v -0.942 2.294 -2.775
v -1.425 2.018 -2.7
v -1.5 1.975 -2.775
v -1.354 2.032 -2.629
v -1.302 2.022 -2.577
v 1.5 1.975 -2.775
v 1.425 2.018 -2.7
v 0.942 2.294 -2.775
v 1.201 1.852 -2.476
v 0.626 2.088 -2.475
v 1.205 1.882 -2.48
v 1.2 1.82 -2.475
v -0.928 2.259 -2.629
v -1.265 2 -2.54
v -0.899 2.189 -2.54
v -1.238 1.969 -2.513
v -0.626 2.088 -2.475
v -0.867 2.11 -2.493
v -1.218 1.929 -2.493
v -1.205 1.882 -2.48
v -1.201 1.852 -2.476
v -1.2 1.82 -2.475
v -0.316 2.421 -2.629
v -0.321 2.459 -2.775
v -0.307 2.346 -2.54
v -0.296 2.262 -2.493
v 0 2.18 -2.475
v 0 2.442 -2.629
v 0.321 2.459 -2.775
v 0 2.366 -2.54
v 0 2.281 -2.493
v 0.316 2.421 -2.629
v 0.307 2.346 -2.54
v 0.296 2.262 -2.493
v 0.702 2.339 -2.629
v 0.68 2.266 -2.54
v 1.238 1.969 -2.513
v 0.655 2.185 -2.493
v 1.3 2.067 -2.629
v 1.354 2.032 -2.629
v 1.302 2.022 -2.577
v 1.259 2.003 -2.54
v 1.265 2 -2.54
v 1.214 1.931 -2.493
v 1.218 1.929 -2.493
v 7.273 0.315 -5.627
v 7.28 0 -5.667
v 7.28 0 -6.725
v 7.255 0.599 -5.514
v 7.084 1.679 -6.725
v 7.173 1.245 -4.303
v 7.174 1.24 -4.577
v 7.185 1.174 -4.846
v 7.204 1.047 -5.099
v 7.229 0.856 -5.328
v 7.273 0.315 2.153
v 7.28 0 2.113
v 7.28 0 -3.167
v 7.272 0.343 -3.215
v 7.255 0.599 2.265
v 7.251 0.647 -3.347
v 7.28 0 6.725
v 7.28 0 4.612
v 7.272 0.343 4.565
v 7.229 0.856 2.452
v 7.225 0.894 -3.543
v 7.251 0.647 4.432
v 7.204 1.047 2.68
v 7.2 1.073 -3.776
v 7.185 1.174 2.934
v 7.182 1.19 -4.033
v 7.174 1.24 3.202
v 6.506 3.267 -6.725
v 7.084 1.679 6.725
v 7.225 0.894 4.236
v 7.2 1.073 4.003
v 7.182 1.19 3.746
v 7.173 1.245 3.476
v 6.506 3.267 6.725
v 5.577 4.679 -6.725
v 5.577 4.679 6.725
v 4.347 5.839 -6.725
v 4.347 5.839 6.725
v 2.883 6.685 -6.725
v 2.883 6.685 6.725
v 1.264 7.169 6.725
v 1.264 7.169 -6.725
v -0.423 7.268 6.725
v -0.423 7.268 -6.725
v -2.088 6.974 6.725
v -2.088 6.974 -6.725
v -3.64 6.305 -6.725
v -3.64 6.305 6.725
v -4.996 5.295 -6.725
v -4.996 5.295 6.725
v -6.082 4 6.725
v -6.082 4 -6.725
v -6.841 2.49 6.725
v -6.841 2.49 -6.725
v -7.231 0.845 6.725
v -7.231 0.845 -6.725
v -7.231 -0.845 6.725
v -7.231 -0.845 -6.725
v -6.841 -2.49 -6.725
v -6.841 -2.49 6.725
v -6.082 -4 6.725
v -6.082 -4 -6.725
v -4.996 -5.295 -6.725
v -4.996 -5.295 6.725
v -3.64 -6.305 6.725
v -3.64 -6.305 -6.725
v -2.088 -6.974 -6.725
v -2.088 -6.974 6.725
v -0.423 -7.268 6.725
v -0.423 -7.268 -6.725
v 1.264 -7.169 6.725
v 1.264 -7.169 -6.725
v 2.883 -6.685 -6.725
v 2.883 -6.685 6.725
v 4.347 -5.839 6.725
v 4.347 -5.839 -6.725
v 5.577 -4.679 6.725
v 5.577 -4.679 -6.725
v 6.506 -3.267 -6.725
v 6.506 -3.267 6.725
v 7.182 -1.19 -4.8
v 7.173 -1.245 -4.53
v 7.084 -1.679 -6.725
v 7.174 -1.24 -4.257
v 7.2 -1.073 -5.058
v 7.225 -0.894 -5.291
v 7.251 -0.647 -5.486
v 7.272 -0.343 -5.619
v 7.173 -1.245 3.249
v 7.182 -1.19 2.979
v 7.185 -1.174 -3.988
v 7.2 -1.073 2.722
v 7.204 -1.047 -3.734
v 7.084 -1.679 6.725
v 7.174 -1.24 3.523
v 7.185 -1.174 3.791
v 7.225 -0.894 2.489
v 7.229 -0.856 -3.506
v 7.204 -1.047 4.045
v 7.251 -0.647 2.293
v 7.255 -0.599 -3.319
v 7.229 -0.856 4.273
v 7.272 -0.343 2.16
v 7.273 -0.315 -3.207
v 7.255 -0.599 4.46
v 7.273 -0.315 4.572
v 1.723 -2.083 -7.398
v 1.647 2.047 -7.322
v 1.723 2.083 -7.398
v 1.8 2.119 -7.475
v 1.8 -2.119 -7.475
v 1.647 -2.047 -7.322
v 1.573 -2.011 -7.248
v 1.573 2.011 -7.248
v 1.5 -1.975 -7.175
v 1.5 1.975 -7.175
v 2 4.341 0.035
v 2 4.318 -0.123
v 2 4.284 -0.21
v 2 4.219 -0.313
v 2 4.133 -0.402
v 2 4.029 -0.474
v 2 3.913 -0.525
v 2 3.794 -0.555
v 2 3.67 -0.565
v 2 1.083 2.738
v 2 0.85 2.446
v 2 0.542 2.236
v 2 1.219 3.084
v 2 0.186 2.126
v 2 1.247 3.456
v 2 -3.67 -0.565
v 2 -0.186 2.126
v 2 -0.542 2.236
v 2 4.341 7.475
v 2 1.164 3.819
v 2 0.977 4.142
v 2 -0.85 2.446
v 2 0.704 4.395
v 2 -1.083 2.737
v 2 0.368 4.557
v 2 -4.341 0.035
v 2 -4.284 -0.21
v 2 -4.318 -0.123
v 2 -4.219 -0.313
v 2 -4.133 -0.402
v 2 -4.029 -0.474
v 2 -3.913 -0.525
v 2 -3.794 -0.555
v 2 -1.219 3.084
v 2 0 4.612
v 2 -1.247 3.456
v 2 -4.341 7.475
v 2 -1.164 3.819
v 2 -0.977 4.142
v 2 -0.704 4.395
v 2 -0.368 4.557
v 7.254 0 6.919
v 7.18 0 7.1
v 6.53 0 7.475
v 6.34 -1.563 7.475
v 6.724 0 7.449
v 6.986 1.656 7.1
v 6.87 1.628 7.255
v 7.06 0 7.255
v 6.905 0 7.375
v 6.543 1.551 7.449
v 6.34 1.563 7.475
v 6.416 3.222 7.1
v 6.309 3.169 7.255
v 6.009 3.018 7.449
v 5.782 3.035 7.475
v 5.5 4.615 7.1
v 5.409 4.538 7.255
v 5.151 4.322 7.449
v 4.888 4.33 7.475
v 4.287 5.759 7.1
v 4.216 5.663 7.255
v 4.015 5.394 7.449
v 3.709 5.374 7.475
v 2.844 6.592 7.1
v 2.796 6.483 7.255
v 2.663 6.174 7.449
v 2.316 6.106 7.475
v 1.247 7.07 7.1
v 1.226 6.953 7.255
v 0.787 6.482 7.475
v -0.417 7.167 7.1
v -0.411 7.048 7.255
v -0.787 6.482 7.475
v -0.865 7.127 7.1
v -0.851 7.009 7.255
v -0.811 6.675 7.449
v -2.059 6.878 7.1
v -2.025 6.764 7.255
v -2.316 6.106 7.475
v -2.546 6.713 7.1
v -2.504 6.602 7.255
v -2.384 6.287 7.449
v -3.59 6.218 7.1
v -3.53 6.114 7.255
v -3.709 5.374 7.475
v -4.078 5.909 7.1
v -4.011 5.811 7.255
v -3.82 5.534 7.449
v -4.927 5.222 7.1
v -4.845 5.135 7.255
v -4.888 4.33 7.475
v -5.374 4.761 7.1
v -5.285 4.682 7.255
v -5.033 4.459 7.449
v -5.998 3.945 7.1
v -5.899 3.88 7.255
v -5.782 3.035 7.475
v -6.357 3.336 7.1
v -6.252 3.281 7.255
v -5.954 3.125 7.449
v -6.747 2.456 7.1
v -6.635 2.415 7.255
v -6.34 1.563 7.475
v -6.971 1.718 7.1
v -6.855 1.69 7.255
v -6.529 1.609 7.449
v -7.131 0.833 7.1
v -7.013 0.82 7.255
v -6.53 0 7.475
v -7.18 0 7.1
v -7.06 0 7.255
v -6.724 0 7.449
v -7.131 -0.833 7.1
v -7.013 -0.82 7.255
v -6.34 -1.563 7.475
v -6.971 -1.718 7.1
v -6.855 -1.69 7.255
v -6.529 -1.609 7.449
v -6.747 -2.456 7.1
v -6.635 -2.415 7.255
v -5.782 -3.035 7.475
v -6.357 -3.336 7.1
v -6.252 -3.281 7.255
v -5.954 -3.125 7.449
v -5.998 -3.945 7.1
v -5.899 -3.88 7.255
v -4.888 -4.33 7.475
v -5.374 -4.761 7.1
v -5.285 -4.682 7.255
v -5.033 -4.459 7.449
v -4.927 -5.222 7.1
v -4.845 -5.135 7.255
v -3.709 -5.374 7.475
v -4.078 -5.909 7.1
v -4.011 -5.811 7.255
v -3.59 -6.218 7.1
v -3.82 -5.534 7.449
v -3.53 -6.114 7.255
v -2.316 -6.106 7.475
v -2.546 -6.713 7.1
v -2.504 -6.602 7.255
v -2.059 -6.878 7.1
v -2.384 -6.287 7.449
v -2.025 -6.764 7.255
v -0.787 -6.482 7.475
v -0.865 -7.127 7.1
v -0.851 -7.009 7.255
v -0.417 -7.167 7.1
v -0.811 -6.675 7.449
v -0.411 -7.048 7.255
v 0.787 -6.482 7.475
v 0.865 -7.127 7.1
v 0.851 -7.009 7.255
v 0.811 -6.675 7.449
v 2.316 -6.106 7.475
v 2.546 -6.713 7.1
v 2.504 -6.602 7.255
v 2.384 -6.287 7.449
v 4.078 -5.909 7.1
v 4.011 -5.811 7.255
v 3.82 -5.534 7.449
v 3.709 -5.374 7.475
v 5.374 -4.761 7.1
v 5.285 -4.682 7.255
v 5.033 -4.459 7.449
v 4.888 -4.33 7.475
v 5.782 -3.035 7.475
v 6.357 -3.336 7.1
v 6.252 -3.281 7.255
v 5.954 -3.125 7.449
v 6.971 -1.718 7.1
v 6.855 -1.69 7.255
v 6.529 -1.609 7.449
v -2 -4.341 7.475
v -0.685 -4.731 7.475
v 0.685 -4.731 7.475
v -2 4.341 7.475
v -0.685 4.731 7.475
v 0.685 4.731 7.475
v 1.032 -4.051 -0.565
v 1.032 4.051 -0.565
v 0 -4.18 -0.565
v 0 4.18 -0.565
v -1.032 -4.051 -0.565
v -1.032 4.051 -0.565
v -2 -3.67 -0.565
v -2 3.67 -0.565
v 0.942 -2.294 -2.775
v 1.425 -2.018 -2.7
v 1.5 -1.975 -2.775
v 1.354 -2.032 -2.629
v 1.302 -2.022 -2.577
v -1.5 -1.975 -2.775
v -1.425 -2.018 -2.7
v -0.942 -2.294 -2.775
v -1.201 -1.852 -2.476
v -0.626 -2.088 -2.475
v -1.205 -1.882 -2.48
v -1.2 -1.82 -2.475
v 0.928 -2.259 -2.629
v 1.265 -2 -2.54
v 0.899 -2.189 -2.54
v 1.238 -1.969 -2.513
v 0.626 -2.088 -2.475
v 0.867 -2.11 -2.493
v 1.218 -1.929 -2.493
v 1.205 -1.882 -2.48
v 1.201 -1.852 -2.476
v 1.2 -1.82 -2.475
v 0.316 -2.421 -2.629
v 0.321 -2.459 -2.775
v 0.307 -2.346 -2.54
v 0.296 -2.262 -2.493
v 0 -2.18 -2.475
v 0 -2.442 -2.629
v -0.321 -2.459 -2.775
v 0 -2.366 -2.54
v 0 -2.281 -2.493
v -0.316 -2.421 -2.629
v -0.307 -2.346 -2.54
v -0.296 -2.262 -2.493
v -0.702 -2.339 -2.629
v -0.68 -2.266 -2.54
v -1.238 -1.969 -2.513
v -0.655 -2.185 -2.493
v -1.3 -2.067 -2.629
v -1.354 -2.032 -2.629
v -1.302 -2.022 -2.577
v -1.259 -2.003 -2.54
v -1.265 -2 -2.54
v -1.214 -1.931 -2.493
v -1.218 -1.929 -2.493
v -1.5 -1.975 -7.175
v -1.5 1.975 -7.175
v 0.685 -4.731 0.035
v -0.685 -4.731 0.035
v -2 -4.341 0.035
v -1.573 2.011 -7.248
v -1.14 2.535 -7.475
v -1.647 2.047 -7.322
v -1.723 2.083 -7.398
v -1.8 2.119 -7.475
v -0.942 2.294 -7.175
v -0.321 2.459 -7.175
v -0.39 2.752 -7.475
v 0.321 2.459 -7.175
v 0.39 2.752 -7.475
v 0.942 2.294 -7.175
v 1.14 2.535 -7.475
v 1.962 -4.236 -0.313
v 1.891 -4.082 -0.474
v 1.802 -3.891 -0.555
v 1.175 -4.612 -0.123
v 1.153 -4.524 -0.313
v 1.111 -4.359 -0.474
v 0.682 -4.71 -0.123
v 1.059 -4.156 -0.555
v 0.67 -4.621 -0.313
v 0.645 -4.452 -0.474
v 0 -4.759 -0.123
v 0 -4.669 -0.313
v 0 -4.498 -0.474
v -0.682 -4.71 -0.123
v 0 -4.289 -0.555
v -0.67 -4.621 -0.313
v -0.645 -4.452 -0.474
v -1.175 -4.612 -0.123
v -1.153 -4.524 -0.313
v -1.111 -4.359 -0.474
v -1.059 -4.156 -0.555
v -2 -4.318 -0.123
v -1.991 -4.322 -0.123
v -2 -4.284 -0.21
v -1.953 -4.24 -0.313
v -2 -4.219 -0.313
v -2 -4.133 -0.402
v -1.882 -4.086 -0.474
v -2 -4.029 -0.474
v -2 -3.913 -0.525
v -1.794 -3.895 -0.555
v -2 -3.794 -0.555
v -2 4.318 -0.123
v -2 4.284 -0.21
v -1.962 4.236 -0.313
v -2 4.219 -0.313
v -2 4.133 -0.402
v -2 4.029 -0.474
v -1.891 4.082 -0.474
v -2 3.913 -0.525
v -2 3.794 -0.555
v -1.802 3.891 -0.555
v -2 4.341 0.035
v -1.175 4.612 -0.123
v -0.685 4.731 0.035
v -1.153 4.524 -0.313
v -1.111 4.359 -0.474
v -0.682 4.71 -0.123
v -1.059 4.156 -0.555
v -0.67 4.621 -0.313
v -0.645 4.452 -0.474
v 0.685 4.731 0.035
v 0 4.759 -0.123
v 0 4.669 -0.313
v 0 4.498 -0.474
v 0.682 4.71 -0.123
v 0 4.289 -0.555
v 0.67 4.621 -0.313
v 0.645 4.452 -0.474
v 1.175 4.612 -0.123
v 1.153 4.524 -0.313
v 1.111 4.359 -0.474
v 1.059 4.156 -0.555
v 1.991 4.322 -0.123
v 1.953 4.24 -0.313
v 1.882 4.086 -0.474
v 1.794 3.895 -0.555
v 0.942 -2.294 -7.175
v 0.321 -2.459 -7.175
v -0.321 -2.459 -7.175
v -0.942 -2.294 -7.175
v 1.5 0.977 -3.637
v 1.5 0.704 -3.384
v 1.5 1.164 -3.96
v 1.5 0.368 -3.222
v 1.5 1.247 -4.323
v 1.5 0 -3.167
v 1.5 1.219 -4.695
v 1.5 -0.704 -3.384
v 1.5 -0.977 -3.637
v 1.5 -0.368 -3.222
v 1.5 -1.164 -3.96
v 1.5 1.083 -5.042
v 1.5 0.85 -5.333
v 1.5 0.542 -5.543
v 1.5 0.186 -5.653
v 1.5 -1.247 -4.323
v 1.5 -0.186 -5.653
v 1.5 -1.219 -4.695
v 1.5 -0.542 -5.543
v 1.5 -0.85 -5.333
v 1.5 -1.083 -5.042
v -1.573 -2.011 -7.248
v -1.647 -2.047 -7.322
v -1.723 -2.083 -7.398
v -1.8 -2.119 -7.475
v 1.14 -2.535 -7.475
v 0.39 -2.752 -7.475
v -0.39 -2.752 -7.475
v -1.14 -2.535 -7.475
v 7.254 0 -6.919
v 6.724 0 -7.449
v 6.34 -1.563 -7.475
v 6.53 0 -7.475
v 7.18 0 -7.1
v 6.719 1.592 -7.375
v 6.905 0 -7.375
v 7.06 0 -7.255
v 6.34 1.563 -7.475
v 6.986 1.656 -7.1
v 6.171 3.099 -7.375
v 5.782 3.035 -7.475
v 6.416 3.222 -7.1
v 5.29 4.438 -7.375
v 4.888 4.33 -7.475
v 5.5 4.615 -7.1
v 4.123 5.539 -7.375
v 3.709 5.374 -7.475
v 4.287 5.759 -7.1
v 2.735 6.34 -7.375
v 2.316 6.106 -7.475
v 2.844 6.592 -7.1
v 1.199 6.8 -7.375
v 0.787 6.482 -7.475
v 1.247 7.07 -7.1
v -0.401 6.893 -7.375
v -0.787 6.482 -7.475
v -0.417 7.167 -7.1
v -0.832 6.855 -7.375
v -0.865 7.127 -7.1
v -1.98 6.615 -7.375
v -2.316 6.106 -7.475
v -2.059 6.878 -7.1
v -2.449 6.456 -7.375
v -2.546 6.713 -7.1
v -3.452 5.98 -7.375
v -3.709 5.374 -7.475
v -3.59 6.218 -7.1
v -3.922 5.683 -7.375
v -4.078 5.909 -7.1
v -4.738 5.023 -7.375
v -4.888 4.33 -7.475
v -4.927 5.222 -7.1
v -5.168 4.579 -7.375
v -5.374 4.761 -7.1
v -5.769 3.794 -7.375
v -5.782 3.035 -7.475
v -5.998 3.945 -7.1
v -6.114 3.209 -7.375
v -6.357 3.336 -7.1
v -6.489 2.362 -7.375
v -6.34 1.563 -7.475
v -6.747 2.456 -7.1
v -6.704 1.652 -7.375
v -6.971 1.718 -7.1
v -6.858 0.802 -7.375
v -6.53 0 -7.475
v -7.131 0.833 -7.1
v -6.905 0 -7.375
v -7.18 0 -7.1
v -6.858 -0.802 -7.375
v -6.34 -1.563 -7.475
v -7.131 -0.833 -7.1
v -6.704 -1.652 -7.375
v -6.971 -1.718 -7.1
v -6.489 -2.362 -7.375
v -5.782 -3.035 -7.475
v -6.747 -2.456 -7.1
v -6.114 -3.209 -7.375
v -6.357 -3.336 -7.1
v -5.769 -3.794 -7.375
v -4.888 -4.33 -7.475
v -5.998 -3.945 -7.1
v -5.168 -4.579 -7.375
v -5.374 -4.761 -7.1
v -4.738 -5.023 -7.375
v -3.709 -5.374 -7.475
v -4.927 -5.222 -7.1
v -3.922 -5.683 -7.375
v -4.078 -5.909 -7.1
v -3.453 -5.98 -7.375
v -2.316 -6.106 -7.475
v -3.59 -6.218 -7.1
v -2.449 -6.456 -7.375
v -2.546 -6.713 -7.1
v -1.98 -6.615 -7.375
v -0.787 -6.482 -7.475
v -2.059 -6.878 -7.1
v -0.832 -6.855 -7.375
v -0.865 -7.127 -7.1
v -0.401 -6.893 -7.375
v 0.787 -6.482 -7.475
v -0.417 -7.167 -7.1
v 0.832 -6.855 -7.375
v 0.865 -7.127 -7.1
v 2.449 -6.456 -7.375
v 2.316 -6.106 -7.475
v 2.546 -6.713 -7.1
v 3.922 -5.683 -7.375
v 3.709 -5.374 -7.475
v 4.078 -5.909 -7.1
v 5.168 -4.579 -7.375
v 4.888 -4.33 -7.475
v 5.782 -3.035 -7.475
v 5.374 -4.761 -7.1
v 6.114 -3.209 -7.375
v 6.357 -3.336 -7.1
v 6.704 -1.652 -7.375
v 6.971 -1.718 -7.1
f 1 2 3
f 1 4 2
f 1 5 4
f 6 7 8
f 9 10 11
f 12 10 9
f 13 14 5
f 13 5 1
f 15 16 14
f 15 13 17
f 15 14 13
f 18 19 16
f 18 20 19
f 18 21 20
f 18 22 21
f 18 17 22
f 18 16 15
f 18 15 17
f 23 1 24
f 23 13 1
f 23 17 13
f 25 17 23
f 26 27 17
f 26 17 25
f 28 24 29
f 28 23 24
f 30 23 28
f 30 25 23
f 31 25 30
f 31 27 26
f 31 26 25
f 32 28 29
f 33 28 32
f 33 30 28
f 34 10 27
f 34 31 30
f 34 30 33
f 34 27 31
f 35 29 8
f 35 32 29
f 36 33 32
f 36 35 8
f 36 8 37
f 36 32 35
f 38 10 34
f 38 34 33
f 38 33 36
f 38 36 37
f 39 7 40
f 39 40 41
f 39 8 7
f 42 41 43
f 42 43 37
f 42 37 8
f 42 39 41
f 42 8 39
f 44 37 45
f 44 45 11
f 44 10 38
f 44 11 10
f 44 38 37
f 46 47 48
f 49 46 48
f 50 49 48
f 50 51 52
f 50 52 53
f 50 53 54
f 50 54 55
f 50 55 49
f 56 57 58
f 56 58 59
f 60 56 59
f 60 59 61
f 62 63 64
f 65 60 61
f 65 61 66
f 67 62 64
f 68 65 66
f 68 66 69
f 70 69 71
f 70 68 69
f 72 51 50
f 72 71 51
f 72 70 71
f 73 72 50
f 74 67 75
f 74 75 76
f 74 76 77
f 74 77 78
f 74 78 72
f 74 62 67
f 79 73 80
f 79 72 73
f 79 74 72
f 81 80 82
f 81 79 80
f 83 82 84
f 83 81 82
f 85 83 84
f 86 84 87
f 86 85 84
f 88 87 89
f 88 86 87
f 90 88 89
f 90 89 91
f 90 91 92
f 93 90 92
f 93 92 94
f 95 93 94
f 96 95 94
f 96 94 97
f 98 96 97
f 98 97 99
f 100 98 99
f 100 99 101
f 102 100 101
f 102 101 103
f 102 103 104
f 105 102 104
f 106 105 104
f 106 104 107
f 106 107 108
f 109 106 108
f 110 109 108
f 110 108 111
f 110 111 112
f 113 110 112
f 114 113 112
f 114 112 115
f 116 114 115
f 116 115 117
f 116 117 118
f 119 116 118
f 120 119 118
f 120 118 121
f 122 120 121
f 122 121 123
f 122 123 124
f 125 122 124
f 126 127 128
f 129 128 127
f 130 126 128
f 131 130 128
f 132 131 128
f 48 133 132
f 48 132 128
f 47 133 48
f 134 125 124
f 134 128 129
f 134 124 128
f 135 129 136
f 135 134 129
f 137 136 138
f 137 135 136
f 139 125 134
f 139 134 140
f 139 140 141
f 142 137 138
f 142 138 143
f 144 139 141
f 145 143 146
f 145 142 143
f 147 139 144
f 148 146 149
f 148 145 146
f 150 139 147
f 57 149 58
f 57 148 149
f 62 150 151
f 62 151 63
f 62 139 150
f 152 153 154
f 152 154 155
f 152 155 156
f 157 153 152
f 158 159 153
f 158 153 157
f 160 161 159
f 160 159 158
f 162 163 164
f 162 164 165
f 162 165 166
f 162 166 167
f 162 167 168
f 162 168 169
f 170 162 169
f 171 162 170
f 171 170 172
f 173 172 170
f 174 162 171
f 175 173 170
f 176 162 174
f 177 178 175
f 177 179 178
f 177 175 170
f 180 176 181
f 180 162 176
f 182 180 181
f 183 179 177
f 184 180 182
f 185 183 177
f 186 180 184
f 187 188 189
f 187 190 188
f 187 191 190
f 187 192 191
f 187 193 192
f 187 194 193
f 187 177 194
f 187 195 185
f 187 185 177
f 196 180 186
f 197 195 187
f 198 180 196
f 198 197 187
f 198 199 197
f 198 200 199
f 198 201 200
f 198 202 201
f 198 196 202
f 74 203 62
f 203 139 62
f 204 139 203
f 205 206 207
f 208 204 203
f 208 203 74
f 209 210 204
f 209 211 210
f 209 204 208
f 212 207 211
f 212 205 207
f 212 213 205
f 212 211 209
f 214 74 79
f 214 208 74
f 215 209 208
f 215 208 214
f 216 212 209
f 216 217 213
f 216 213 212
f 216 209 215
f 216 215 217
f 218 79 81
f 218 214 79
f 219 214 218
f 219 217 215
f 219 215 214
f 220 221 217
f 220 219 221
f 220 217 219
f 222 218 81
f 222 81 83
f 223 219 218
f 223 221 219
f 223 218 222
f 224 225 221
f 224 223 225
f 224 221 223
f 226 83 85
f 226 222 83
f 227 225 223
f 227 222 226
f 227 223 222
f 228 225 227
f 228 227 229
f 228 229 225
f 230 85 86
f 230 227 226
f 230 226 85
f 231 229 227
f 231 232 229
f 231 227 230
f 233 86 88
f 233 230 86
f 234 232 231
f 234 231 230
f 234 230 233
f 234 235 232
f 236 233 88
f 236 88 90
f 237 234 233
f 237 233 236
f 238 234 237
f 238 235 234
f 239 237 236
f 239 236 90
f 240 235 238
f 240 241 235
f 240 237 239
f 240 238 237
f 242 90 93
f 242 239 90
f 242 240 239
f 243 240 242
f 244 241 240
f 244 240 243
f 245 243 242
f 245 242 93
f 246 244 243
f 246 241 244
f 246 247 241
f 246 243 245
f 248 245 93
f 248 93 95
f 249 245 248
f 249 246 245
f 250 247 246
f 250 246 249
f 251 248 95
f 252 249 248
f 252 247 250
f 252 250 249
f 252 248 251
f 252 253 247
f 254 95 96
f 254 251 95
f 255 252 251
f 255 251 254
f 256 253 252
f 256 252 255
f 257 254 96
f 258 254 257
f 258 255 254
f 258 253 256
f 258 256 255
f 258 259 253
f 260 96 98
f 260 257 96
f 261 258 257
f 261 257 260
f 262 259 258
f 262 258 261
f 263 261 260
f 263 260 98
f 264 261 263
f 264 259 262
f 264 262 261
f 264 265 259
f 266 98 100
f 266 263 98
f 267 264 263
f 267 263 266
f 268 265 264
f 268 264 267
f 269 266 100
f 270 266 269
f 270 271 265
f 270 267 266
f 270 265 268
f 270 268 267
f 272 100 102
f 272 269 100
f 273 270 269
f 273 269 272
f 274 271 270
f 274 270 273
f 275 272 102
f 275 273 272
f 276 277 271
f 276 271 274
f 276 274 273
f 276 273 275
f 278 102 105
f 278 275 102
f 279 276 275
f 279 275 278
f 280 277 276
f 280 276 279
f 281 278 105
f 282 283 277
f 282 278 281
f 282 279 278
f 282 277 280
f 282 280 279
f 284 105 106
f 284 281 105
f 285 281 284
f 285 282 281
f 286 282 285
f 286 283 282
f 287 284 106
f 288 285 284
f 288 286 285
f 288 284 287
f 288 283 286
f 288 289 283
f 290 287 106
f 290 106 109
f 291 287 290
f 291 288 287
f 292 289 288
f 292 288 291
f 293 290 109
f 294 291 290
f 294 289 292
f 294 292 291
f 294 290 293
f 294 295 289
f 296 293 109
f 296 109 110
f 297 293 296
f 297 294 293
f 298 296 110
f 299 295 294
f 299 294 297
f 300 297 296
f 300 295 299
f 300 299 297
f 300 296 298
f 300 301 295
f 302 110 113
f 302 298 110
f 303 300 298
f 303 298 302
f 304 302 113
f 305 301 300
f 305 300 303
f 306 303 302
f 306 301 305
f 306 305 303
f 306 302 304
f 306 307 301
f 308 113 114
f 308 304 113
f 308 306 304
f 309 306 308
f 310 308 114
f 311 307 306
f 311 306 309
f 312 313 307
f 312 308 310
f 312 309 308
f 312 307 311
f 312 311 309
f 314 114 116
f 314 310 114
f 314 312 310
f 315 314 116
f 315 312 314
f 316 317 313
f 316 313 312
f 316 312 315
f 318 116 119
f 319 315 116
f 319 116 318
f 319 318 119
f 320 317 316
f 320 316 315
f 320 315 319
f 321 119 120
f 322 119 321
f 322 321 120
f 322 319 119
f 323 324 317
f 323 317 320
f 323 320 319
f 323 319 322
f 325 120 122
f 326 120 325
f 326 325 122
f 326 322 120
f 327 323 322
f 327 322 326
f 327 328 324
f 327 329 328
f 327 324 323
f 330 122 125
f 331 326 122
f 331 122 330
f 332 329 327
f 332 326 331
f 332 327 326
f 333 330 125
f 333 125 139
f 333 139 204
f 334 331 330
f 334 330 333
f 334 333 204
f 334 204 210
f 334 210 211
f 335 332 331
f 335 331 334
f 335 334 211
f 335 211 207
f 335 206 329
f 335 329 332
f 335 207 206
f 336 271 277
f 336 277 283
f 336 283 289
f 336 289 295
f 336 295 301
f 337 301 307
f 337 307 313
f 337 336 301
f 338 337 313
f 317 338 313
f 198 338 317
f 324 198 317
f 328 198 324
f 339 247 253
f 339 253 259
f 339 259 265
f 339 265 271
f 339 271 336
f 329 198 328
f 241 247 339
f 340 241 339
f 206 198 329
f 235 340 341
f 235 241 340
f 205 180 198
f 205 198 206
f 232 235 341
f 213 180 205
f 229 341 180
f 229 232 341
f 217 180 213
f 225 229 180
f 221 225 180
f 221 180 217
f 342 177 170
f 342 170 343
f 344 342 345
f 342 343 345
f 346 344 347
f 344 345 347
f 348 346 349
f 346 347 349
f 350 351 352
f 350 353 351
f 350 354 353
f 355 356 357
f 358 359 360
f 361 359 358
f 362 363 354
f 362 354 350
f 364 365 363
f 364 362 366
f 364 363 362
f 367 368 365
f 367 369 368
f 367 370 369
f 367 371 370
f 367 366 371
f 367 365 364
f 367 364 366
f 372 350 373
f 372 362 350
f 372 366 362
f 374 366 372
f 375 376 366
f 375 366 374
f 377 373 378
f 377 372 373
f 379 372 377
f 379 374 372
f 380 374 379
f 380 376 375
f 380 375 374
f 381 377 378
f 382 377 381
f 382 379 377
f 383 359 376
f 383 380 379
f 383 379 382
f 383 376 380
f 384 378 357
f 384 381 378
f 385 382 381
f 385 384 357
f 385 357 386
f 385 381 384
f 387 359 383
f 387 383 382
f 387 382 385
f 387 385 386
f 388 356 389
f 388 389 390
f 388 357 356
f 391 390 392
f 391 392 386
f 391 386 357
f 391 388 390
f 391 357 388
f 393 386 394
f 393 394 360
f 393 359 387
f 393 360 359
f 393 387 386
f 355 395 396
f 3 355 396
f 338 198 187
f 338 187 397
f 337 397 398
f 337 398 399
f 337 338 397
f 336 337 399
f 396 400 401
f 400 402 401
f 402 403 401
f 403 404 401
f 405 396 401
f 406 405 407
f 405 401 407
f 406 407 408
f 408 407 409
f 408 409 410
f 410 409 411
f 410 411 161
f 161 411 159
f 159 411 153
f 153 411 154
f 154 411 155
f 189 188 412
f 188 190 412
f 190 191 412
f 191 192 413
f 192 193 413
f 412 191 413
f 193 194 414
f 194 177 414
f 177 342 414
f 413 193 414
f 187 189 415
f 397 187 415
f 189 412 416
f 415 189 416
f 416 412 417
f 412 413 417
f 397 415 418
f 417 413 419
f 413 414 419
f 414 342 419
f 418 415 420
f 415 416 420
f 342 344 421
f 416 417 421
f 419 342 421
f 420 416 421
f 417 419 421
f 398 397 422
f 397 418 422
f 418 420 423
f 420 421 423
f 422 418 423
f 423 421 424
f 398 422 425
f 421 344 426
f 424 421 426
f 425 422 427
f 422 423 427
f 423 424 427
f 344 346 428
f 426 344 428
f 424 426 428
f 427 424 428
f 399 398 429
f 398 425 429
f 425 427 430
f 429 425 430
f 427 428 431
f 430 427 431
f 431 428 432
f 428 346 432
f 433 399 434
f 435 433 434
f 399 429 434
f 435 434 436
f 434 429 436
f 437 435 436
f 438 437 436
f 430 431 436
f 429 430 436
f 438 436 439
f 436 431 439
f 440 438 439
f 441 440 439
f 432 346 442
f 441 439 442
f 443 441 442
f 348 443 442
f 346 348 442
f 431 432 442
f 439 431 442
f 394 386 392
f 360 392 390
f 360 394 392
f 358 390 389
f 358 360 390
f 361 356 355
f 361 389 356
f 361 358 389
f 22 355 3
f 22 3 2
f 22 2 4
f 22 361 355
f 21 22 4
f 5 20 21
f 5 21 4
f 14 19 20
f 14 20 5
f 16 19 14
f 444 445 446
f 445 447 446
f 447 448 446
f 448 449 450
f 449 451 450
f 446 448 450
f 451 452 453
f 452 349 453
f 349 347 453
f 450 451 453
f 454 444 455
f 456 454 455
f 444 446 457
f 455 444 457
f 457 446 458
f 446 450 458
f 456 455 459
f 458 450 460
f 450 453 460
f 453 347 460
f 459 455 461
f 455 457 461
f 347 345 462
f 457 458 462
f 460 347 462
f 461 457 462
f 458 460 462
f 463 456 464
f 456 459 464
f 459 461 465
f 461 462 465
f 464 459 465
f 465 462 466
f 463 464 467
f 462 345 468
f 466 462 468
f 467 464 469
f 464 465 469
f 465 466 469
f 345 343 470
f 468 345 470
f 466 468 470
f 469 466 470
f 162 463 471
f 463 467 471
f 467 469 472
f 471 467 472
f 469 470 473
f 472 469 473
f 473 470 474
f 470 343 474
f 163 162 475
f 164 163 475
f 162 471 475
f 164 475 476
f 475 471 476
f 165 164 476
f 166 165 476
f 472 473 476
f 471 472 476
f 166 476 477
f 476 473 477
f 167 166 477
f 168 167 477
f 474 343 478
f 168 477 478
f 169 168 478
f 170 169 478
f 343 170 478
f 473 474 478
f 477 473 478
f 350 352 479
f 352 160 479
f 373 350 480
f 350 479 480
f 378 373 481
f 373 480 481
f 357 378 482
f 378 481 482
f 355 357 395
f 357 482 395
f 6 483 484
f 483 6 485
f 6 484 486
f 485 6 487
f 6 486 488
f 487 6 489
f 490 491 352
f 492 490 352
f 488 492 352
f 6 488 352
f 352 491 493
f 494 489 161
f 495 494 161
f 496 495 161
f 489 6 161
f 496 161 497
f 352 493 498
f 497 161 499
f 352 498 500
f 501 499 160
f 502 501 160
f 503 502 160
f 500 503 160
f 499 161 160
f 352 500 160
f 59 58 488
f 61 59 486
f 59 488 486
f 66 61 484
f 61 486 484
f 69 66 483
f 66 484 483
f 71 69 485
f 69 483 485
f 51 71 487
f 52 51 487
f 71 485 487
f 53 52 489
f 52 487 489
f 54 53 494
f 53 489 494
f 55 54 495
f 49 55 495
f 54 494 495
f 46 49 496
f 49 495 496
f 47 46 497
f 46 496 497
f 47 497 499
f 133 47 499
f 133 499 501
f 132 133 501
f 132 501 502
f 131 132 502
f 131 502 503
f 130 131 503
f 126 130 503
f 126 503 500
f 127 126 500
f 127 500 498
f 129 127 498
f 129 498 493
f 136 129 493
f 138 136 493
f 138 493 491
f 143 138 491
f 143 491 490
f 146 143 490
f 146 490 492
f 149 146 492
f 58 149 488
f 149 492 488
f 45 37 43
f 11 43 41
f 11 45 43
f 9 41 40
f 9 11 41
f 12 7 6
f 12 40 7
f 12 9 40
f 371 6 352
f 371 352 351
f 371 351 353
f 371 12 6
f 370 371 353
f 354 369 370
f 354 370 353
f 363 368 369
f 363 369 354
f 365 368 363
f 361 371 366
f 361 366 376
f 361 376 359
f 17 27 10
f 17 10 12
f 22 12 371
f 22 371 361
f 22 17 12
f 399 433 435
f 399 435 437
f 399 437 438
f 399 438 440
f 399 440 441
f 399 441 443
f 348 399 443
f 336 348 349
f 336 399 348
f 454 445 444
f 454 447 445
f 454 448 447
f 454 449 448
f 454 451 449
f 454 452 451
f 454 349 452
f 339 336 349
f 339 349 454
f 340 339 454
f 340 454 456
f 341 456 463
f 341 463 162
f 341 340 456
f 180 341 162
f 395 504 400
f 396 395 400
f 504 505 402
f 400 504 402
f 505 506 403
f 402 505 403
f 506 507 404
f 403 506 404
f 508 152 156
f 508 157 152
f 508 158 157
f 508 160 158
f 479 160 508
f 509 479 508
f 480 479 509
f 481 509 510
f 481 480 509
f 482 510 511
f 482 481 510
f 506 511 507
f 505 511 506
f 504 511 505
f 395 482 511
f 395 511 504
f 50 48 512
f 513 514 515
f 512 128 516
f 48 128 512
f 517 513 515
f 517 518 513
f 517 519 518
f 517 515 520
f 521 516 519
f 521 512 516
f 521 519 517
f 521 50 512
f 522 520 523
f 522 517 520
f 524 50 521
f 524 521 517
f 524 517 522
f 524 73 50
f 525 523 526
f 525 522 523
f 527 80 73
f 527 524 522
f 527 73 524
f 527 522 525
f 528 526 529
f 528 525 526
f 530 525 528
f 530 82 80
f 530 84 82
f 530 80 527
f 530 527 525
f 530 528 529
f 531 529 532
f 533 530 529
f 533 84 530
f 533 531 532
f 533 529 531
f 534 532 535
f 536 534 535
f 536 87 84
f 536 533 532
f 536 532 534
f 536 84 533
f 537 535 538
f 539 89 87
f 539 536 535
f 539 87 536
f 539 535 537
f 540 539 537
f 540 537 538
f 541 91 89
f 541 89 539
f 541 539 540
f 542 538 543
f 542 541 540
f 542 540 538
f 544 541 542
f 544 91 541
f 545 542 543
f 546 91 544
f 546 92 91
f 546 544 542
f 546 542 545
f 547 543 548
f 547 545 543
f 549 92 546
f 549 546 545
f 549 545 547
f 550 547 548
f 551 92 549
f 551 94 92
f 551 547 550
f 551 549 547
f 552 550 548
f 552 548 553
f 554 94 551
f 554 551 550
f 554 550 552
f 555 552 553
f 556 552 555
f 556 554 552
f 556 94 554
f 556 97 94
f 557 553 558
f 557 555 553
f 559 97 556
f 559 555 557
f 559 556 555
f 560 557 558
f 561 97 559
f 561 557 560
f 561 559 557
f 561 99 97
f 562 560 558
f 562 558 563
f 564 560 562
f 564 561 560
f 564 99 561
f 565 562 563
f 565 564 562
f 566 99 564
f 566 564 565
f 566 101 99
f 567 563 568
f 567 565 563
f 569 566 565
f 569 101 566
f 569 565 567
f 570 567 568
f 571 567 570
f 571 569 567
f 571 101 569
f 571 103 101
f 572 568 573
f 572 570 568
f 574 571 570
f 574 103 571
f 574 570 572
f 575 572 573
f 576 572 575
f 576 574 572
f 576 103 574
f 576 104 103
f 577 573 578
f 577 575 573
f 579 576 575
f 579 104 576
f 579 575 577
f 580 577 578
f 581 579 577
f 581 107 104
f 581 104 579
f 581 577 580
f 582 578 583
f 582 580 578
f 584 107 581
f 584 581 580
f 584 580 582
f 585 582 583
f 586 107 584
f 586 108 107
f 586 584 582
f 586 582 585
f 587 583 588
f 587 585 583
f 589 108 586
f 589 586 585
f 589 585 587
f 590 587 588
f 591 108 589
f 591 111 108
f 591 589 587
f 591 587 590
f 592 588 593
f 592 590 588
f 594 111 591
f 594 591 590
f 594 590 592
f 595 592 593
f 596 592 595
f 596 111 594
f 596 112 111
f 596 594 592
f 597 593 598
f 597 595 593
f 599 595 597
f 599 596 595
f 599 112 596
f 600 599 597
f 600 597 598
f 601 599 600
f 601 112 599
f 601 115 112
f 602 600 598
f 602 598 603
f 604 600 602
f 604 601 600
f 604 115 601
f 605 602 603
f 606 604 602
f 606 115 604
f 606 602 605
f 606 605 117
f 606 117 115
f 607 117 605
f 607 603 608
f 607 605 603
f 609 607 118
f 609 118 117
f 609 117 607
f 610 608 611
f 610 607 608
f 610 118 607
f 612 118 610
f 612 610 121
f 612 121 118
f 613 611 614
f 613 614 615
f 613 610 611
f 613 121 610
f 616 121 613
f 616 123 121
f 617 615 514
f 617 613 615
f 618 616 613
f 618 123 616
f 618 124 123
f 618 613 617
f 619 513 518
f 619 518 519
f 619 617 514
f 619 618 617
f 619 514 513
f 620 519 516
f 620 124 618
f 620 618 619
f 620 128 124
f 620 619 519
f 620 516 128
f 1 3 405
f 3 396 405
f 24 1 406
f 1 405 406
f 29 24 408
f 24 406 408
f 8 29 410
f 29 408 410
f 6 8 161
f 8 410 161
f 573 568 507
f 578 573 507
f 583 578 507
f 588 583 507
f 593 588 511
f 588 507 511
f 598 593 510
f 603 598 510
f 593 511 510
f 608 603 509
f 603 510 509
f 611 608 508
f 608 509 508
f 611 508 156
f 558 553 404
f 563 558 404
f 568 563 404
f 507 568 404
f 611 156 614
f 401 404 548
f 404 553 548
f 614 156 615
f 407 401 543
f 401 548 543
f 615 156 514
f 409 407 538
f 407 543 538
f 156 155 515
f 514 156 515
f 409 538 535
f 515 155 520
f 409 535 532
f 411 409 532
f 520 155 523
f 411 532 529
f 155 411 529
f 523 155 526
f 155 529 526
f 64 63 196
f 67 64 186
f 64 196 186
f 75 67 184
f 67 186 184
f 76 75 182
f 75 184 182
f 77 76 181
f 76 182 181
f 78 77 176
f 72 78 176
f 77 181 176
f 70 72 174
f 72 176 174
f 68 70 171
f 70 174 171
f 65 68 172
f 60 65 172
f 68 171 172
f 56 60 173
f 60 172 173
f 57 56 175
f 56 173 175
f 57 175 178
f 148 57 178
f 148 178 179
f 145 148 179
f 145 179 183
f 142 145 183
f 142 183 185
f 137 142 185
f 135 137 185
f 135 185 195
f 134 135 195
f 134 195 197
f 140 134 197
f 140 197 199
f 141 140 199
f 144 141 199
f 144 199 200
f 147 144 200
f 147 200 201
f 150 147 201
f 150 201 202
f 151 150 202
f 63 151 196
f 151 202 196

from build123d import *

# Parameters (mm, degrees)
SKETCH1_R             = 7.28
BOSS_EXTRUDE1_DEPTH   = 7.475
CUT_EXTRUDE1_DEPTH    = 8.04
CUT_EXTRUDE2_DEPTH    = 5
CHAMFER2_SIZE         = 0.3
CHAMFER4_SIZE         = 0.3
FILLET1_R             = 0.75
FILLET2_R             = 0.6
FILLET3_R             = 0.3
M3_TAPPED_HOLE3_D     = 2.5
M3_TAPPED_HOLE3_DEPTH = 6
M3_TAPPED_HOLE3_TIP   = 0.751075774
M3_TAPPED_HOLE4_D     = 2.5
M3_TAPPED_HOLE4_DEPTH = 6.5
M3_TAPPED_HOLE4_TIP   = 0.751075774


with BuildPart() as part:
    # Sketch1 → Boss-Extrude1 (new, symmetric)
    with BuildSketch(Plane.XY):
        Circle(SKETCH1_R)
    extrude(amount=BOSS_EXTRUDE1_DEPTH, both=True)

    # Sketch3 → Cut-Extrude1 (cut)
    with BuildSketch(Plane.XY.offset(7.475)):
        with BuildLine():
            ThreePointArc((2, 4.341474404), (0, 4.78), (-2, 4.341474404))
            Line((-2, 4.341474404), (-2, -4.341474404))
            ThreePointArc((-2, -4.341474404), (0, -4.78), (2, -4.341474404))
            Line((2, -4.341474404), (2, 4.341474404))
        make_face()
    extrude(amount=-CUT_EXTRUDE1_DEPTH, mode=Mode.SUBTRACT)

    # Sketch4 → Cut-Extrude2 (cut)
    with BuildSketch(Plane(origin=(0, 0, -7.475), x_dir=(-1, 0, 0), z_dir=(0, 0, -1))):
        with BuildLine():
            Line((-1.5, 1.974943037), (-1.5, -1.974943037))
            ThreePointArc((-1.5, -1.974943037), (0, -2.48), (1.5, -1.974943037))
            Line((1.5, -1.974943037), (1.5, 1.974943037))
            ThreePointArc((1.5, 1.974943037), (0, 2.48), (-1.5, 1.974943037))
        make_face()
    extrude(amount=-CUT_EXTRUDE2_DEPTH, mode=Mode.SUBTRACT)

    # Chamfer2
    chamfer2_edges = [part.edges().sort_by_distance(p)[0] for p in [
        (-1.5, 0, -2.475),
        (1.5, 0, -2.475),
    ]]
    chamfer(chamfer2_edges, length=CHAMFER2_SIZE)

    # Chamfer4
    chamfer4_edges = [part.edges().sort_by_distance(p)[0] for p in [
        (0, -2.48, -7.475),
        (-1.5, 0, -7.475),
        (0, 2.48, -7.475),
        (1.5, 0, -7.475),
    ]]
    chamfer(chamfer4_edges, length=CHAMFER4_SIZE)

    # Fillet1
    fillet1_edges = [part.edges().sort_by_distance(p)[0] for p in [
        (-7.28, 0, 7.475),
        (-7.28, 0, -7.475),
    ]]
    fillet(fillet1_edges, radius=FILLET1_R)

    # Fillet2
    fillet2_edges = [part.edges().sort_by_distance(p)[0] for p in [
        (0, -4.78, -0.565),
        (0, 4.78, -0.565),
    ]]
    fillet(fillet2_edges, radius=FILLET2_R)

    # Fillet3
    fillet3_edges = [part.edges().sort_by_distance(p)[0] for p in [
        (0, 2.48, -2.475),
        (0, -2.48, -2.475),
    ]]
    fillet(fillet3_edges, radius=FILLET3_R)

    # M3 Tapped Hole3
    with Locations(Plane(origin=(7.28, 0, 0), x_dir=(0, 0, -1), z_dir=(1, 0, 0))):
        with Locations((-3.3625, 0)):
            Hole(M3_TAPPED_HOLE3_D / 2, depth=M3_TAPPED_HOLE3_DEPTH)
            with Locations((0, 0, -(M3_TAPPED_HOLE3_DEPTH + M3_TAPPED_HOLE3_TIP / 2))):  # 118° drill point
                Cone(0, M3_TAPPED_HOLE3_D / 2, M3_TAPPED_HOLE3_TIP, mode=Mode.SUBTRACT)

    # M3 Tapped Hole4
    with Locations(Plane(origin=(7.28, 0, 0), x_dir=(0, 0, -1), z_dir=(1, 0, 0))):
        with Locations((4.41685425, 0)):
            Hole(M3_TAPPED_HOLE4_D / 2, depth=M3_TAPPED_HOLE4_DEPTH)
            with Locations((0, 0, -(M3_TAPPED_HOLE4_DEPTH + M3_TAPPED_HOLE4_TIP / 2))):  # 118° drill point
                Cone(0, M3_TAPPED_HOLE4_D / 2, M3_TAPPED_HOLE4_TIP, mode=Mode.SUBTRACT)


solid = part.part
